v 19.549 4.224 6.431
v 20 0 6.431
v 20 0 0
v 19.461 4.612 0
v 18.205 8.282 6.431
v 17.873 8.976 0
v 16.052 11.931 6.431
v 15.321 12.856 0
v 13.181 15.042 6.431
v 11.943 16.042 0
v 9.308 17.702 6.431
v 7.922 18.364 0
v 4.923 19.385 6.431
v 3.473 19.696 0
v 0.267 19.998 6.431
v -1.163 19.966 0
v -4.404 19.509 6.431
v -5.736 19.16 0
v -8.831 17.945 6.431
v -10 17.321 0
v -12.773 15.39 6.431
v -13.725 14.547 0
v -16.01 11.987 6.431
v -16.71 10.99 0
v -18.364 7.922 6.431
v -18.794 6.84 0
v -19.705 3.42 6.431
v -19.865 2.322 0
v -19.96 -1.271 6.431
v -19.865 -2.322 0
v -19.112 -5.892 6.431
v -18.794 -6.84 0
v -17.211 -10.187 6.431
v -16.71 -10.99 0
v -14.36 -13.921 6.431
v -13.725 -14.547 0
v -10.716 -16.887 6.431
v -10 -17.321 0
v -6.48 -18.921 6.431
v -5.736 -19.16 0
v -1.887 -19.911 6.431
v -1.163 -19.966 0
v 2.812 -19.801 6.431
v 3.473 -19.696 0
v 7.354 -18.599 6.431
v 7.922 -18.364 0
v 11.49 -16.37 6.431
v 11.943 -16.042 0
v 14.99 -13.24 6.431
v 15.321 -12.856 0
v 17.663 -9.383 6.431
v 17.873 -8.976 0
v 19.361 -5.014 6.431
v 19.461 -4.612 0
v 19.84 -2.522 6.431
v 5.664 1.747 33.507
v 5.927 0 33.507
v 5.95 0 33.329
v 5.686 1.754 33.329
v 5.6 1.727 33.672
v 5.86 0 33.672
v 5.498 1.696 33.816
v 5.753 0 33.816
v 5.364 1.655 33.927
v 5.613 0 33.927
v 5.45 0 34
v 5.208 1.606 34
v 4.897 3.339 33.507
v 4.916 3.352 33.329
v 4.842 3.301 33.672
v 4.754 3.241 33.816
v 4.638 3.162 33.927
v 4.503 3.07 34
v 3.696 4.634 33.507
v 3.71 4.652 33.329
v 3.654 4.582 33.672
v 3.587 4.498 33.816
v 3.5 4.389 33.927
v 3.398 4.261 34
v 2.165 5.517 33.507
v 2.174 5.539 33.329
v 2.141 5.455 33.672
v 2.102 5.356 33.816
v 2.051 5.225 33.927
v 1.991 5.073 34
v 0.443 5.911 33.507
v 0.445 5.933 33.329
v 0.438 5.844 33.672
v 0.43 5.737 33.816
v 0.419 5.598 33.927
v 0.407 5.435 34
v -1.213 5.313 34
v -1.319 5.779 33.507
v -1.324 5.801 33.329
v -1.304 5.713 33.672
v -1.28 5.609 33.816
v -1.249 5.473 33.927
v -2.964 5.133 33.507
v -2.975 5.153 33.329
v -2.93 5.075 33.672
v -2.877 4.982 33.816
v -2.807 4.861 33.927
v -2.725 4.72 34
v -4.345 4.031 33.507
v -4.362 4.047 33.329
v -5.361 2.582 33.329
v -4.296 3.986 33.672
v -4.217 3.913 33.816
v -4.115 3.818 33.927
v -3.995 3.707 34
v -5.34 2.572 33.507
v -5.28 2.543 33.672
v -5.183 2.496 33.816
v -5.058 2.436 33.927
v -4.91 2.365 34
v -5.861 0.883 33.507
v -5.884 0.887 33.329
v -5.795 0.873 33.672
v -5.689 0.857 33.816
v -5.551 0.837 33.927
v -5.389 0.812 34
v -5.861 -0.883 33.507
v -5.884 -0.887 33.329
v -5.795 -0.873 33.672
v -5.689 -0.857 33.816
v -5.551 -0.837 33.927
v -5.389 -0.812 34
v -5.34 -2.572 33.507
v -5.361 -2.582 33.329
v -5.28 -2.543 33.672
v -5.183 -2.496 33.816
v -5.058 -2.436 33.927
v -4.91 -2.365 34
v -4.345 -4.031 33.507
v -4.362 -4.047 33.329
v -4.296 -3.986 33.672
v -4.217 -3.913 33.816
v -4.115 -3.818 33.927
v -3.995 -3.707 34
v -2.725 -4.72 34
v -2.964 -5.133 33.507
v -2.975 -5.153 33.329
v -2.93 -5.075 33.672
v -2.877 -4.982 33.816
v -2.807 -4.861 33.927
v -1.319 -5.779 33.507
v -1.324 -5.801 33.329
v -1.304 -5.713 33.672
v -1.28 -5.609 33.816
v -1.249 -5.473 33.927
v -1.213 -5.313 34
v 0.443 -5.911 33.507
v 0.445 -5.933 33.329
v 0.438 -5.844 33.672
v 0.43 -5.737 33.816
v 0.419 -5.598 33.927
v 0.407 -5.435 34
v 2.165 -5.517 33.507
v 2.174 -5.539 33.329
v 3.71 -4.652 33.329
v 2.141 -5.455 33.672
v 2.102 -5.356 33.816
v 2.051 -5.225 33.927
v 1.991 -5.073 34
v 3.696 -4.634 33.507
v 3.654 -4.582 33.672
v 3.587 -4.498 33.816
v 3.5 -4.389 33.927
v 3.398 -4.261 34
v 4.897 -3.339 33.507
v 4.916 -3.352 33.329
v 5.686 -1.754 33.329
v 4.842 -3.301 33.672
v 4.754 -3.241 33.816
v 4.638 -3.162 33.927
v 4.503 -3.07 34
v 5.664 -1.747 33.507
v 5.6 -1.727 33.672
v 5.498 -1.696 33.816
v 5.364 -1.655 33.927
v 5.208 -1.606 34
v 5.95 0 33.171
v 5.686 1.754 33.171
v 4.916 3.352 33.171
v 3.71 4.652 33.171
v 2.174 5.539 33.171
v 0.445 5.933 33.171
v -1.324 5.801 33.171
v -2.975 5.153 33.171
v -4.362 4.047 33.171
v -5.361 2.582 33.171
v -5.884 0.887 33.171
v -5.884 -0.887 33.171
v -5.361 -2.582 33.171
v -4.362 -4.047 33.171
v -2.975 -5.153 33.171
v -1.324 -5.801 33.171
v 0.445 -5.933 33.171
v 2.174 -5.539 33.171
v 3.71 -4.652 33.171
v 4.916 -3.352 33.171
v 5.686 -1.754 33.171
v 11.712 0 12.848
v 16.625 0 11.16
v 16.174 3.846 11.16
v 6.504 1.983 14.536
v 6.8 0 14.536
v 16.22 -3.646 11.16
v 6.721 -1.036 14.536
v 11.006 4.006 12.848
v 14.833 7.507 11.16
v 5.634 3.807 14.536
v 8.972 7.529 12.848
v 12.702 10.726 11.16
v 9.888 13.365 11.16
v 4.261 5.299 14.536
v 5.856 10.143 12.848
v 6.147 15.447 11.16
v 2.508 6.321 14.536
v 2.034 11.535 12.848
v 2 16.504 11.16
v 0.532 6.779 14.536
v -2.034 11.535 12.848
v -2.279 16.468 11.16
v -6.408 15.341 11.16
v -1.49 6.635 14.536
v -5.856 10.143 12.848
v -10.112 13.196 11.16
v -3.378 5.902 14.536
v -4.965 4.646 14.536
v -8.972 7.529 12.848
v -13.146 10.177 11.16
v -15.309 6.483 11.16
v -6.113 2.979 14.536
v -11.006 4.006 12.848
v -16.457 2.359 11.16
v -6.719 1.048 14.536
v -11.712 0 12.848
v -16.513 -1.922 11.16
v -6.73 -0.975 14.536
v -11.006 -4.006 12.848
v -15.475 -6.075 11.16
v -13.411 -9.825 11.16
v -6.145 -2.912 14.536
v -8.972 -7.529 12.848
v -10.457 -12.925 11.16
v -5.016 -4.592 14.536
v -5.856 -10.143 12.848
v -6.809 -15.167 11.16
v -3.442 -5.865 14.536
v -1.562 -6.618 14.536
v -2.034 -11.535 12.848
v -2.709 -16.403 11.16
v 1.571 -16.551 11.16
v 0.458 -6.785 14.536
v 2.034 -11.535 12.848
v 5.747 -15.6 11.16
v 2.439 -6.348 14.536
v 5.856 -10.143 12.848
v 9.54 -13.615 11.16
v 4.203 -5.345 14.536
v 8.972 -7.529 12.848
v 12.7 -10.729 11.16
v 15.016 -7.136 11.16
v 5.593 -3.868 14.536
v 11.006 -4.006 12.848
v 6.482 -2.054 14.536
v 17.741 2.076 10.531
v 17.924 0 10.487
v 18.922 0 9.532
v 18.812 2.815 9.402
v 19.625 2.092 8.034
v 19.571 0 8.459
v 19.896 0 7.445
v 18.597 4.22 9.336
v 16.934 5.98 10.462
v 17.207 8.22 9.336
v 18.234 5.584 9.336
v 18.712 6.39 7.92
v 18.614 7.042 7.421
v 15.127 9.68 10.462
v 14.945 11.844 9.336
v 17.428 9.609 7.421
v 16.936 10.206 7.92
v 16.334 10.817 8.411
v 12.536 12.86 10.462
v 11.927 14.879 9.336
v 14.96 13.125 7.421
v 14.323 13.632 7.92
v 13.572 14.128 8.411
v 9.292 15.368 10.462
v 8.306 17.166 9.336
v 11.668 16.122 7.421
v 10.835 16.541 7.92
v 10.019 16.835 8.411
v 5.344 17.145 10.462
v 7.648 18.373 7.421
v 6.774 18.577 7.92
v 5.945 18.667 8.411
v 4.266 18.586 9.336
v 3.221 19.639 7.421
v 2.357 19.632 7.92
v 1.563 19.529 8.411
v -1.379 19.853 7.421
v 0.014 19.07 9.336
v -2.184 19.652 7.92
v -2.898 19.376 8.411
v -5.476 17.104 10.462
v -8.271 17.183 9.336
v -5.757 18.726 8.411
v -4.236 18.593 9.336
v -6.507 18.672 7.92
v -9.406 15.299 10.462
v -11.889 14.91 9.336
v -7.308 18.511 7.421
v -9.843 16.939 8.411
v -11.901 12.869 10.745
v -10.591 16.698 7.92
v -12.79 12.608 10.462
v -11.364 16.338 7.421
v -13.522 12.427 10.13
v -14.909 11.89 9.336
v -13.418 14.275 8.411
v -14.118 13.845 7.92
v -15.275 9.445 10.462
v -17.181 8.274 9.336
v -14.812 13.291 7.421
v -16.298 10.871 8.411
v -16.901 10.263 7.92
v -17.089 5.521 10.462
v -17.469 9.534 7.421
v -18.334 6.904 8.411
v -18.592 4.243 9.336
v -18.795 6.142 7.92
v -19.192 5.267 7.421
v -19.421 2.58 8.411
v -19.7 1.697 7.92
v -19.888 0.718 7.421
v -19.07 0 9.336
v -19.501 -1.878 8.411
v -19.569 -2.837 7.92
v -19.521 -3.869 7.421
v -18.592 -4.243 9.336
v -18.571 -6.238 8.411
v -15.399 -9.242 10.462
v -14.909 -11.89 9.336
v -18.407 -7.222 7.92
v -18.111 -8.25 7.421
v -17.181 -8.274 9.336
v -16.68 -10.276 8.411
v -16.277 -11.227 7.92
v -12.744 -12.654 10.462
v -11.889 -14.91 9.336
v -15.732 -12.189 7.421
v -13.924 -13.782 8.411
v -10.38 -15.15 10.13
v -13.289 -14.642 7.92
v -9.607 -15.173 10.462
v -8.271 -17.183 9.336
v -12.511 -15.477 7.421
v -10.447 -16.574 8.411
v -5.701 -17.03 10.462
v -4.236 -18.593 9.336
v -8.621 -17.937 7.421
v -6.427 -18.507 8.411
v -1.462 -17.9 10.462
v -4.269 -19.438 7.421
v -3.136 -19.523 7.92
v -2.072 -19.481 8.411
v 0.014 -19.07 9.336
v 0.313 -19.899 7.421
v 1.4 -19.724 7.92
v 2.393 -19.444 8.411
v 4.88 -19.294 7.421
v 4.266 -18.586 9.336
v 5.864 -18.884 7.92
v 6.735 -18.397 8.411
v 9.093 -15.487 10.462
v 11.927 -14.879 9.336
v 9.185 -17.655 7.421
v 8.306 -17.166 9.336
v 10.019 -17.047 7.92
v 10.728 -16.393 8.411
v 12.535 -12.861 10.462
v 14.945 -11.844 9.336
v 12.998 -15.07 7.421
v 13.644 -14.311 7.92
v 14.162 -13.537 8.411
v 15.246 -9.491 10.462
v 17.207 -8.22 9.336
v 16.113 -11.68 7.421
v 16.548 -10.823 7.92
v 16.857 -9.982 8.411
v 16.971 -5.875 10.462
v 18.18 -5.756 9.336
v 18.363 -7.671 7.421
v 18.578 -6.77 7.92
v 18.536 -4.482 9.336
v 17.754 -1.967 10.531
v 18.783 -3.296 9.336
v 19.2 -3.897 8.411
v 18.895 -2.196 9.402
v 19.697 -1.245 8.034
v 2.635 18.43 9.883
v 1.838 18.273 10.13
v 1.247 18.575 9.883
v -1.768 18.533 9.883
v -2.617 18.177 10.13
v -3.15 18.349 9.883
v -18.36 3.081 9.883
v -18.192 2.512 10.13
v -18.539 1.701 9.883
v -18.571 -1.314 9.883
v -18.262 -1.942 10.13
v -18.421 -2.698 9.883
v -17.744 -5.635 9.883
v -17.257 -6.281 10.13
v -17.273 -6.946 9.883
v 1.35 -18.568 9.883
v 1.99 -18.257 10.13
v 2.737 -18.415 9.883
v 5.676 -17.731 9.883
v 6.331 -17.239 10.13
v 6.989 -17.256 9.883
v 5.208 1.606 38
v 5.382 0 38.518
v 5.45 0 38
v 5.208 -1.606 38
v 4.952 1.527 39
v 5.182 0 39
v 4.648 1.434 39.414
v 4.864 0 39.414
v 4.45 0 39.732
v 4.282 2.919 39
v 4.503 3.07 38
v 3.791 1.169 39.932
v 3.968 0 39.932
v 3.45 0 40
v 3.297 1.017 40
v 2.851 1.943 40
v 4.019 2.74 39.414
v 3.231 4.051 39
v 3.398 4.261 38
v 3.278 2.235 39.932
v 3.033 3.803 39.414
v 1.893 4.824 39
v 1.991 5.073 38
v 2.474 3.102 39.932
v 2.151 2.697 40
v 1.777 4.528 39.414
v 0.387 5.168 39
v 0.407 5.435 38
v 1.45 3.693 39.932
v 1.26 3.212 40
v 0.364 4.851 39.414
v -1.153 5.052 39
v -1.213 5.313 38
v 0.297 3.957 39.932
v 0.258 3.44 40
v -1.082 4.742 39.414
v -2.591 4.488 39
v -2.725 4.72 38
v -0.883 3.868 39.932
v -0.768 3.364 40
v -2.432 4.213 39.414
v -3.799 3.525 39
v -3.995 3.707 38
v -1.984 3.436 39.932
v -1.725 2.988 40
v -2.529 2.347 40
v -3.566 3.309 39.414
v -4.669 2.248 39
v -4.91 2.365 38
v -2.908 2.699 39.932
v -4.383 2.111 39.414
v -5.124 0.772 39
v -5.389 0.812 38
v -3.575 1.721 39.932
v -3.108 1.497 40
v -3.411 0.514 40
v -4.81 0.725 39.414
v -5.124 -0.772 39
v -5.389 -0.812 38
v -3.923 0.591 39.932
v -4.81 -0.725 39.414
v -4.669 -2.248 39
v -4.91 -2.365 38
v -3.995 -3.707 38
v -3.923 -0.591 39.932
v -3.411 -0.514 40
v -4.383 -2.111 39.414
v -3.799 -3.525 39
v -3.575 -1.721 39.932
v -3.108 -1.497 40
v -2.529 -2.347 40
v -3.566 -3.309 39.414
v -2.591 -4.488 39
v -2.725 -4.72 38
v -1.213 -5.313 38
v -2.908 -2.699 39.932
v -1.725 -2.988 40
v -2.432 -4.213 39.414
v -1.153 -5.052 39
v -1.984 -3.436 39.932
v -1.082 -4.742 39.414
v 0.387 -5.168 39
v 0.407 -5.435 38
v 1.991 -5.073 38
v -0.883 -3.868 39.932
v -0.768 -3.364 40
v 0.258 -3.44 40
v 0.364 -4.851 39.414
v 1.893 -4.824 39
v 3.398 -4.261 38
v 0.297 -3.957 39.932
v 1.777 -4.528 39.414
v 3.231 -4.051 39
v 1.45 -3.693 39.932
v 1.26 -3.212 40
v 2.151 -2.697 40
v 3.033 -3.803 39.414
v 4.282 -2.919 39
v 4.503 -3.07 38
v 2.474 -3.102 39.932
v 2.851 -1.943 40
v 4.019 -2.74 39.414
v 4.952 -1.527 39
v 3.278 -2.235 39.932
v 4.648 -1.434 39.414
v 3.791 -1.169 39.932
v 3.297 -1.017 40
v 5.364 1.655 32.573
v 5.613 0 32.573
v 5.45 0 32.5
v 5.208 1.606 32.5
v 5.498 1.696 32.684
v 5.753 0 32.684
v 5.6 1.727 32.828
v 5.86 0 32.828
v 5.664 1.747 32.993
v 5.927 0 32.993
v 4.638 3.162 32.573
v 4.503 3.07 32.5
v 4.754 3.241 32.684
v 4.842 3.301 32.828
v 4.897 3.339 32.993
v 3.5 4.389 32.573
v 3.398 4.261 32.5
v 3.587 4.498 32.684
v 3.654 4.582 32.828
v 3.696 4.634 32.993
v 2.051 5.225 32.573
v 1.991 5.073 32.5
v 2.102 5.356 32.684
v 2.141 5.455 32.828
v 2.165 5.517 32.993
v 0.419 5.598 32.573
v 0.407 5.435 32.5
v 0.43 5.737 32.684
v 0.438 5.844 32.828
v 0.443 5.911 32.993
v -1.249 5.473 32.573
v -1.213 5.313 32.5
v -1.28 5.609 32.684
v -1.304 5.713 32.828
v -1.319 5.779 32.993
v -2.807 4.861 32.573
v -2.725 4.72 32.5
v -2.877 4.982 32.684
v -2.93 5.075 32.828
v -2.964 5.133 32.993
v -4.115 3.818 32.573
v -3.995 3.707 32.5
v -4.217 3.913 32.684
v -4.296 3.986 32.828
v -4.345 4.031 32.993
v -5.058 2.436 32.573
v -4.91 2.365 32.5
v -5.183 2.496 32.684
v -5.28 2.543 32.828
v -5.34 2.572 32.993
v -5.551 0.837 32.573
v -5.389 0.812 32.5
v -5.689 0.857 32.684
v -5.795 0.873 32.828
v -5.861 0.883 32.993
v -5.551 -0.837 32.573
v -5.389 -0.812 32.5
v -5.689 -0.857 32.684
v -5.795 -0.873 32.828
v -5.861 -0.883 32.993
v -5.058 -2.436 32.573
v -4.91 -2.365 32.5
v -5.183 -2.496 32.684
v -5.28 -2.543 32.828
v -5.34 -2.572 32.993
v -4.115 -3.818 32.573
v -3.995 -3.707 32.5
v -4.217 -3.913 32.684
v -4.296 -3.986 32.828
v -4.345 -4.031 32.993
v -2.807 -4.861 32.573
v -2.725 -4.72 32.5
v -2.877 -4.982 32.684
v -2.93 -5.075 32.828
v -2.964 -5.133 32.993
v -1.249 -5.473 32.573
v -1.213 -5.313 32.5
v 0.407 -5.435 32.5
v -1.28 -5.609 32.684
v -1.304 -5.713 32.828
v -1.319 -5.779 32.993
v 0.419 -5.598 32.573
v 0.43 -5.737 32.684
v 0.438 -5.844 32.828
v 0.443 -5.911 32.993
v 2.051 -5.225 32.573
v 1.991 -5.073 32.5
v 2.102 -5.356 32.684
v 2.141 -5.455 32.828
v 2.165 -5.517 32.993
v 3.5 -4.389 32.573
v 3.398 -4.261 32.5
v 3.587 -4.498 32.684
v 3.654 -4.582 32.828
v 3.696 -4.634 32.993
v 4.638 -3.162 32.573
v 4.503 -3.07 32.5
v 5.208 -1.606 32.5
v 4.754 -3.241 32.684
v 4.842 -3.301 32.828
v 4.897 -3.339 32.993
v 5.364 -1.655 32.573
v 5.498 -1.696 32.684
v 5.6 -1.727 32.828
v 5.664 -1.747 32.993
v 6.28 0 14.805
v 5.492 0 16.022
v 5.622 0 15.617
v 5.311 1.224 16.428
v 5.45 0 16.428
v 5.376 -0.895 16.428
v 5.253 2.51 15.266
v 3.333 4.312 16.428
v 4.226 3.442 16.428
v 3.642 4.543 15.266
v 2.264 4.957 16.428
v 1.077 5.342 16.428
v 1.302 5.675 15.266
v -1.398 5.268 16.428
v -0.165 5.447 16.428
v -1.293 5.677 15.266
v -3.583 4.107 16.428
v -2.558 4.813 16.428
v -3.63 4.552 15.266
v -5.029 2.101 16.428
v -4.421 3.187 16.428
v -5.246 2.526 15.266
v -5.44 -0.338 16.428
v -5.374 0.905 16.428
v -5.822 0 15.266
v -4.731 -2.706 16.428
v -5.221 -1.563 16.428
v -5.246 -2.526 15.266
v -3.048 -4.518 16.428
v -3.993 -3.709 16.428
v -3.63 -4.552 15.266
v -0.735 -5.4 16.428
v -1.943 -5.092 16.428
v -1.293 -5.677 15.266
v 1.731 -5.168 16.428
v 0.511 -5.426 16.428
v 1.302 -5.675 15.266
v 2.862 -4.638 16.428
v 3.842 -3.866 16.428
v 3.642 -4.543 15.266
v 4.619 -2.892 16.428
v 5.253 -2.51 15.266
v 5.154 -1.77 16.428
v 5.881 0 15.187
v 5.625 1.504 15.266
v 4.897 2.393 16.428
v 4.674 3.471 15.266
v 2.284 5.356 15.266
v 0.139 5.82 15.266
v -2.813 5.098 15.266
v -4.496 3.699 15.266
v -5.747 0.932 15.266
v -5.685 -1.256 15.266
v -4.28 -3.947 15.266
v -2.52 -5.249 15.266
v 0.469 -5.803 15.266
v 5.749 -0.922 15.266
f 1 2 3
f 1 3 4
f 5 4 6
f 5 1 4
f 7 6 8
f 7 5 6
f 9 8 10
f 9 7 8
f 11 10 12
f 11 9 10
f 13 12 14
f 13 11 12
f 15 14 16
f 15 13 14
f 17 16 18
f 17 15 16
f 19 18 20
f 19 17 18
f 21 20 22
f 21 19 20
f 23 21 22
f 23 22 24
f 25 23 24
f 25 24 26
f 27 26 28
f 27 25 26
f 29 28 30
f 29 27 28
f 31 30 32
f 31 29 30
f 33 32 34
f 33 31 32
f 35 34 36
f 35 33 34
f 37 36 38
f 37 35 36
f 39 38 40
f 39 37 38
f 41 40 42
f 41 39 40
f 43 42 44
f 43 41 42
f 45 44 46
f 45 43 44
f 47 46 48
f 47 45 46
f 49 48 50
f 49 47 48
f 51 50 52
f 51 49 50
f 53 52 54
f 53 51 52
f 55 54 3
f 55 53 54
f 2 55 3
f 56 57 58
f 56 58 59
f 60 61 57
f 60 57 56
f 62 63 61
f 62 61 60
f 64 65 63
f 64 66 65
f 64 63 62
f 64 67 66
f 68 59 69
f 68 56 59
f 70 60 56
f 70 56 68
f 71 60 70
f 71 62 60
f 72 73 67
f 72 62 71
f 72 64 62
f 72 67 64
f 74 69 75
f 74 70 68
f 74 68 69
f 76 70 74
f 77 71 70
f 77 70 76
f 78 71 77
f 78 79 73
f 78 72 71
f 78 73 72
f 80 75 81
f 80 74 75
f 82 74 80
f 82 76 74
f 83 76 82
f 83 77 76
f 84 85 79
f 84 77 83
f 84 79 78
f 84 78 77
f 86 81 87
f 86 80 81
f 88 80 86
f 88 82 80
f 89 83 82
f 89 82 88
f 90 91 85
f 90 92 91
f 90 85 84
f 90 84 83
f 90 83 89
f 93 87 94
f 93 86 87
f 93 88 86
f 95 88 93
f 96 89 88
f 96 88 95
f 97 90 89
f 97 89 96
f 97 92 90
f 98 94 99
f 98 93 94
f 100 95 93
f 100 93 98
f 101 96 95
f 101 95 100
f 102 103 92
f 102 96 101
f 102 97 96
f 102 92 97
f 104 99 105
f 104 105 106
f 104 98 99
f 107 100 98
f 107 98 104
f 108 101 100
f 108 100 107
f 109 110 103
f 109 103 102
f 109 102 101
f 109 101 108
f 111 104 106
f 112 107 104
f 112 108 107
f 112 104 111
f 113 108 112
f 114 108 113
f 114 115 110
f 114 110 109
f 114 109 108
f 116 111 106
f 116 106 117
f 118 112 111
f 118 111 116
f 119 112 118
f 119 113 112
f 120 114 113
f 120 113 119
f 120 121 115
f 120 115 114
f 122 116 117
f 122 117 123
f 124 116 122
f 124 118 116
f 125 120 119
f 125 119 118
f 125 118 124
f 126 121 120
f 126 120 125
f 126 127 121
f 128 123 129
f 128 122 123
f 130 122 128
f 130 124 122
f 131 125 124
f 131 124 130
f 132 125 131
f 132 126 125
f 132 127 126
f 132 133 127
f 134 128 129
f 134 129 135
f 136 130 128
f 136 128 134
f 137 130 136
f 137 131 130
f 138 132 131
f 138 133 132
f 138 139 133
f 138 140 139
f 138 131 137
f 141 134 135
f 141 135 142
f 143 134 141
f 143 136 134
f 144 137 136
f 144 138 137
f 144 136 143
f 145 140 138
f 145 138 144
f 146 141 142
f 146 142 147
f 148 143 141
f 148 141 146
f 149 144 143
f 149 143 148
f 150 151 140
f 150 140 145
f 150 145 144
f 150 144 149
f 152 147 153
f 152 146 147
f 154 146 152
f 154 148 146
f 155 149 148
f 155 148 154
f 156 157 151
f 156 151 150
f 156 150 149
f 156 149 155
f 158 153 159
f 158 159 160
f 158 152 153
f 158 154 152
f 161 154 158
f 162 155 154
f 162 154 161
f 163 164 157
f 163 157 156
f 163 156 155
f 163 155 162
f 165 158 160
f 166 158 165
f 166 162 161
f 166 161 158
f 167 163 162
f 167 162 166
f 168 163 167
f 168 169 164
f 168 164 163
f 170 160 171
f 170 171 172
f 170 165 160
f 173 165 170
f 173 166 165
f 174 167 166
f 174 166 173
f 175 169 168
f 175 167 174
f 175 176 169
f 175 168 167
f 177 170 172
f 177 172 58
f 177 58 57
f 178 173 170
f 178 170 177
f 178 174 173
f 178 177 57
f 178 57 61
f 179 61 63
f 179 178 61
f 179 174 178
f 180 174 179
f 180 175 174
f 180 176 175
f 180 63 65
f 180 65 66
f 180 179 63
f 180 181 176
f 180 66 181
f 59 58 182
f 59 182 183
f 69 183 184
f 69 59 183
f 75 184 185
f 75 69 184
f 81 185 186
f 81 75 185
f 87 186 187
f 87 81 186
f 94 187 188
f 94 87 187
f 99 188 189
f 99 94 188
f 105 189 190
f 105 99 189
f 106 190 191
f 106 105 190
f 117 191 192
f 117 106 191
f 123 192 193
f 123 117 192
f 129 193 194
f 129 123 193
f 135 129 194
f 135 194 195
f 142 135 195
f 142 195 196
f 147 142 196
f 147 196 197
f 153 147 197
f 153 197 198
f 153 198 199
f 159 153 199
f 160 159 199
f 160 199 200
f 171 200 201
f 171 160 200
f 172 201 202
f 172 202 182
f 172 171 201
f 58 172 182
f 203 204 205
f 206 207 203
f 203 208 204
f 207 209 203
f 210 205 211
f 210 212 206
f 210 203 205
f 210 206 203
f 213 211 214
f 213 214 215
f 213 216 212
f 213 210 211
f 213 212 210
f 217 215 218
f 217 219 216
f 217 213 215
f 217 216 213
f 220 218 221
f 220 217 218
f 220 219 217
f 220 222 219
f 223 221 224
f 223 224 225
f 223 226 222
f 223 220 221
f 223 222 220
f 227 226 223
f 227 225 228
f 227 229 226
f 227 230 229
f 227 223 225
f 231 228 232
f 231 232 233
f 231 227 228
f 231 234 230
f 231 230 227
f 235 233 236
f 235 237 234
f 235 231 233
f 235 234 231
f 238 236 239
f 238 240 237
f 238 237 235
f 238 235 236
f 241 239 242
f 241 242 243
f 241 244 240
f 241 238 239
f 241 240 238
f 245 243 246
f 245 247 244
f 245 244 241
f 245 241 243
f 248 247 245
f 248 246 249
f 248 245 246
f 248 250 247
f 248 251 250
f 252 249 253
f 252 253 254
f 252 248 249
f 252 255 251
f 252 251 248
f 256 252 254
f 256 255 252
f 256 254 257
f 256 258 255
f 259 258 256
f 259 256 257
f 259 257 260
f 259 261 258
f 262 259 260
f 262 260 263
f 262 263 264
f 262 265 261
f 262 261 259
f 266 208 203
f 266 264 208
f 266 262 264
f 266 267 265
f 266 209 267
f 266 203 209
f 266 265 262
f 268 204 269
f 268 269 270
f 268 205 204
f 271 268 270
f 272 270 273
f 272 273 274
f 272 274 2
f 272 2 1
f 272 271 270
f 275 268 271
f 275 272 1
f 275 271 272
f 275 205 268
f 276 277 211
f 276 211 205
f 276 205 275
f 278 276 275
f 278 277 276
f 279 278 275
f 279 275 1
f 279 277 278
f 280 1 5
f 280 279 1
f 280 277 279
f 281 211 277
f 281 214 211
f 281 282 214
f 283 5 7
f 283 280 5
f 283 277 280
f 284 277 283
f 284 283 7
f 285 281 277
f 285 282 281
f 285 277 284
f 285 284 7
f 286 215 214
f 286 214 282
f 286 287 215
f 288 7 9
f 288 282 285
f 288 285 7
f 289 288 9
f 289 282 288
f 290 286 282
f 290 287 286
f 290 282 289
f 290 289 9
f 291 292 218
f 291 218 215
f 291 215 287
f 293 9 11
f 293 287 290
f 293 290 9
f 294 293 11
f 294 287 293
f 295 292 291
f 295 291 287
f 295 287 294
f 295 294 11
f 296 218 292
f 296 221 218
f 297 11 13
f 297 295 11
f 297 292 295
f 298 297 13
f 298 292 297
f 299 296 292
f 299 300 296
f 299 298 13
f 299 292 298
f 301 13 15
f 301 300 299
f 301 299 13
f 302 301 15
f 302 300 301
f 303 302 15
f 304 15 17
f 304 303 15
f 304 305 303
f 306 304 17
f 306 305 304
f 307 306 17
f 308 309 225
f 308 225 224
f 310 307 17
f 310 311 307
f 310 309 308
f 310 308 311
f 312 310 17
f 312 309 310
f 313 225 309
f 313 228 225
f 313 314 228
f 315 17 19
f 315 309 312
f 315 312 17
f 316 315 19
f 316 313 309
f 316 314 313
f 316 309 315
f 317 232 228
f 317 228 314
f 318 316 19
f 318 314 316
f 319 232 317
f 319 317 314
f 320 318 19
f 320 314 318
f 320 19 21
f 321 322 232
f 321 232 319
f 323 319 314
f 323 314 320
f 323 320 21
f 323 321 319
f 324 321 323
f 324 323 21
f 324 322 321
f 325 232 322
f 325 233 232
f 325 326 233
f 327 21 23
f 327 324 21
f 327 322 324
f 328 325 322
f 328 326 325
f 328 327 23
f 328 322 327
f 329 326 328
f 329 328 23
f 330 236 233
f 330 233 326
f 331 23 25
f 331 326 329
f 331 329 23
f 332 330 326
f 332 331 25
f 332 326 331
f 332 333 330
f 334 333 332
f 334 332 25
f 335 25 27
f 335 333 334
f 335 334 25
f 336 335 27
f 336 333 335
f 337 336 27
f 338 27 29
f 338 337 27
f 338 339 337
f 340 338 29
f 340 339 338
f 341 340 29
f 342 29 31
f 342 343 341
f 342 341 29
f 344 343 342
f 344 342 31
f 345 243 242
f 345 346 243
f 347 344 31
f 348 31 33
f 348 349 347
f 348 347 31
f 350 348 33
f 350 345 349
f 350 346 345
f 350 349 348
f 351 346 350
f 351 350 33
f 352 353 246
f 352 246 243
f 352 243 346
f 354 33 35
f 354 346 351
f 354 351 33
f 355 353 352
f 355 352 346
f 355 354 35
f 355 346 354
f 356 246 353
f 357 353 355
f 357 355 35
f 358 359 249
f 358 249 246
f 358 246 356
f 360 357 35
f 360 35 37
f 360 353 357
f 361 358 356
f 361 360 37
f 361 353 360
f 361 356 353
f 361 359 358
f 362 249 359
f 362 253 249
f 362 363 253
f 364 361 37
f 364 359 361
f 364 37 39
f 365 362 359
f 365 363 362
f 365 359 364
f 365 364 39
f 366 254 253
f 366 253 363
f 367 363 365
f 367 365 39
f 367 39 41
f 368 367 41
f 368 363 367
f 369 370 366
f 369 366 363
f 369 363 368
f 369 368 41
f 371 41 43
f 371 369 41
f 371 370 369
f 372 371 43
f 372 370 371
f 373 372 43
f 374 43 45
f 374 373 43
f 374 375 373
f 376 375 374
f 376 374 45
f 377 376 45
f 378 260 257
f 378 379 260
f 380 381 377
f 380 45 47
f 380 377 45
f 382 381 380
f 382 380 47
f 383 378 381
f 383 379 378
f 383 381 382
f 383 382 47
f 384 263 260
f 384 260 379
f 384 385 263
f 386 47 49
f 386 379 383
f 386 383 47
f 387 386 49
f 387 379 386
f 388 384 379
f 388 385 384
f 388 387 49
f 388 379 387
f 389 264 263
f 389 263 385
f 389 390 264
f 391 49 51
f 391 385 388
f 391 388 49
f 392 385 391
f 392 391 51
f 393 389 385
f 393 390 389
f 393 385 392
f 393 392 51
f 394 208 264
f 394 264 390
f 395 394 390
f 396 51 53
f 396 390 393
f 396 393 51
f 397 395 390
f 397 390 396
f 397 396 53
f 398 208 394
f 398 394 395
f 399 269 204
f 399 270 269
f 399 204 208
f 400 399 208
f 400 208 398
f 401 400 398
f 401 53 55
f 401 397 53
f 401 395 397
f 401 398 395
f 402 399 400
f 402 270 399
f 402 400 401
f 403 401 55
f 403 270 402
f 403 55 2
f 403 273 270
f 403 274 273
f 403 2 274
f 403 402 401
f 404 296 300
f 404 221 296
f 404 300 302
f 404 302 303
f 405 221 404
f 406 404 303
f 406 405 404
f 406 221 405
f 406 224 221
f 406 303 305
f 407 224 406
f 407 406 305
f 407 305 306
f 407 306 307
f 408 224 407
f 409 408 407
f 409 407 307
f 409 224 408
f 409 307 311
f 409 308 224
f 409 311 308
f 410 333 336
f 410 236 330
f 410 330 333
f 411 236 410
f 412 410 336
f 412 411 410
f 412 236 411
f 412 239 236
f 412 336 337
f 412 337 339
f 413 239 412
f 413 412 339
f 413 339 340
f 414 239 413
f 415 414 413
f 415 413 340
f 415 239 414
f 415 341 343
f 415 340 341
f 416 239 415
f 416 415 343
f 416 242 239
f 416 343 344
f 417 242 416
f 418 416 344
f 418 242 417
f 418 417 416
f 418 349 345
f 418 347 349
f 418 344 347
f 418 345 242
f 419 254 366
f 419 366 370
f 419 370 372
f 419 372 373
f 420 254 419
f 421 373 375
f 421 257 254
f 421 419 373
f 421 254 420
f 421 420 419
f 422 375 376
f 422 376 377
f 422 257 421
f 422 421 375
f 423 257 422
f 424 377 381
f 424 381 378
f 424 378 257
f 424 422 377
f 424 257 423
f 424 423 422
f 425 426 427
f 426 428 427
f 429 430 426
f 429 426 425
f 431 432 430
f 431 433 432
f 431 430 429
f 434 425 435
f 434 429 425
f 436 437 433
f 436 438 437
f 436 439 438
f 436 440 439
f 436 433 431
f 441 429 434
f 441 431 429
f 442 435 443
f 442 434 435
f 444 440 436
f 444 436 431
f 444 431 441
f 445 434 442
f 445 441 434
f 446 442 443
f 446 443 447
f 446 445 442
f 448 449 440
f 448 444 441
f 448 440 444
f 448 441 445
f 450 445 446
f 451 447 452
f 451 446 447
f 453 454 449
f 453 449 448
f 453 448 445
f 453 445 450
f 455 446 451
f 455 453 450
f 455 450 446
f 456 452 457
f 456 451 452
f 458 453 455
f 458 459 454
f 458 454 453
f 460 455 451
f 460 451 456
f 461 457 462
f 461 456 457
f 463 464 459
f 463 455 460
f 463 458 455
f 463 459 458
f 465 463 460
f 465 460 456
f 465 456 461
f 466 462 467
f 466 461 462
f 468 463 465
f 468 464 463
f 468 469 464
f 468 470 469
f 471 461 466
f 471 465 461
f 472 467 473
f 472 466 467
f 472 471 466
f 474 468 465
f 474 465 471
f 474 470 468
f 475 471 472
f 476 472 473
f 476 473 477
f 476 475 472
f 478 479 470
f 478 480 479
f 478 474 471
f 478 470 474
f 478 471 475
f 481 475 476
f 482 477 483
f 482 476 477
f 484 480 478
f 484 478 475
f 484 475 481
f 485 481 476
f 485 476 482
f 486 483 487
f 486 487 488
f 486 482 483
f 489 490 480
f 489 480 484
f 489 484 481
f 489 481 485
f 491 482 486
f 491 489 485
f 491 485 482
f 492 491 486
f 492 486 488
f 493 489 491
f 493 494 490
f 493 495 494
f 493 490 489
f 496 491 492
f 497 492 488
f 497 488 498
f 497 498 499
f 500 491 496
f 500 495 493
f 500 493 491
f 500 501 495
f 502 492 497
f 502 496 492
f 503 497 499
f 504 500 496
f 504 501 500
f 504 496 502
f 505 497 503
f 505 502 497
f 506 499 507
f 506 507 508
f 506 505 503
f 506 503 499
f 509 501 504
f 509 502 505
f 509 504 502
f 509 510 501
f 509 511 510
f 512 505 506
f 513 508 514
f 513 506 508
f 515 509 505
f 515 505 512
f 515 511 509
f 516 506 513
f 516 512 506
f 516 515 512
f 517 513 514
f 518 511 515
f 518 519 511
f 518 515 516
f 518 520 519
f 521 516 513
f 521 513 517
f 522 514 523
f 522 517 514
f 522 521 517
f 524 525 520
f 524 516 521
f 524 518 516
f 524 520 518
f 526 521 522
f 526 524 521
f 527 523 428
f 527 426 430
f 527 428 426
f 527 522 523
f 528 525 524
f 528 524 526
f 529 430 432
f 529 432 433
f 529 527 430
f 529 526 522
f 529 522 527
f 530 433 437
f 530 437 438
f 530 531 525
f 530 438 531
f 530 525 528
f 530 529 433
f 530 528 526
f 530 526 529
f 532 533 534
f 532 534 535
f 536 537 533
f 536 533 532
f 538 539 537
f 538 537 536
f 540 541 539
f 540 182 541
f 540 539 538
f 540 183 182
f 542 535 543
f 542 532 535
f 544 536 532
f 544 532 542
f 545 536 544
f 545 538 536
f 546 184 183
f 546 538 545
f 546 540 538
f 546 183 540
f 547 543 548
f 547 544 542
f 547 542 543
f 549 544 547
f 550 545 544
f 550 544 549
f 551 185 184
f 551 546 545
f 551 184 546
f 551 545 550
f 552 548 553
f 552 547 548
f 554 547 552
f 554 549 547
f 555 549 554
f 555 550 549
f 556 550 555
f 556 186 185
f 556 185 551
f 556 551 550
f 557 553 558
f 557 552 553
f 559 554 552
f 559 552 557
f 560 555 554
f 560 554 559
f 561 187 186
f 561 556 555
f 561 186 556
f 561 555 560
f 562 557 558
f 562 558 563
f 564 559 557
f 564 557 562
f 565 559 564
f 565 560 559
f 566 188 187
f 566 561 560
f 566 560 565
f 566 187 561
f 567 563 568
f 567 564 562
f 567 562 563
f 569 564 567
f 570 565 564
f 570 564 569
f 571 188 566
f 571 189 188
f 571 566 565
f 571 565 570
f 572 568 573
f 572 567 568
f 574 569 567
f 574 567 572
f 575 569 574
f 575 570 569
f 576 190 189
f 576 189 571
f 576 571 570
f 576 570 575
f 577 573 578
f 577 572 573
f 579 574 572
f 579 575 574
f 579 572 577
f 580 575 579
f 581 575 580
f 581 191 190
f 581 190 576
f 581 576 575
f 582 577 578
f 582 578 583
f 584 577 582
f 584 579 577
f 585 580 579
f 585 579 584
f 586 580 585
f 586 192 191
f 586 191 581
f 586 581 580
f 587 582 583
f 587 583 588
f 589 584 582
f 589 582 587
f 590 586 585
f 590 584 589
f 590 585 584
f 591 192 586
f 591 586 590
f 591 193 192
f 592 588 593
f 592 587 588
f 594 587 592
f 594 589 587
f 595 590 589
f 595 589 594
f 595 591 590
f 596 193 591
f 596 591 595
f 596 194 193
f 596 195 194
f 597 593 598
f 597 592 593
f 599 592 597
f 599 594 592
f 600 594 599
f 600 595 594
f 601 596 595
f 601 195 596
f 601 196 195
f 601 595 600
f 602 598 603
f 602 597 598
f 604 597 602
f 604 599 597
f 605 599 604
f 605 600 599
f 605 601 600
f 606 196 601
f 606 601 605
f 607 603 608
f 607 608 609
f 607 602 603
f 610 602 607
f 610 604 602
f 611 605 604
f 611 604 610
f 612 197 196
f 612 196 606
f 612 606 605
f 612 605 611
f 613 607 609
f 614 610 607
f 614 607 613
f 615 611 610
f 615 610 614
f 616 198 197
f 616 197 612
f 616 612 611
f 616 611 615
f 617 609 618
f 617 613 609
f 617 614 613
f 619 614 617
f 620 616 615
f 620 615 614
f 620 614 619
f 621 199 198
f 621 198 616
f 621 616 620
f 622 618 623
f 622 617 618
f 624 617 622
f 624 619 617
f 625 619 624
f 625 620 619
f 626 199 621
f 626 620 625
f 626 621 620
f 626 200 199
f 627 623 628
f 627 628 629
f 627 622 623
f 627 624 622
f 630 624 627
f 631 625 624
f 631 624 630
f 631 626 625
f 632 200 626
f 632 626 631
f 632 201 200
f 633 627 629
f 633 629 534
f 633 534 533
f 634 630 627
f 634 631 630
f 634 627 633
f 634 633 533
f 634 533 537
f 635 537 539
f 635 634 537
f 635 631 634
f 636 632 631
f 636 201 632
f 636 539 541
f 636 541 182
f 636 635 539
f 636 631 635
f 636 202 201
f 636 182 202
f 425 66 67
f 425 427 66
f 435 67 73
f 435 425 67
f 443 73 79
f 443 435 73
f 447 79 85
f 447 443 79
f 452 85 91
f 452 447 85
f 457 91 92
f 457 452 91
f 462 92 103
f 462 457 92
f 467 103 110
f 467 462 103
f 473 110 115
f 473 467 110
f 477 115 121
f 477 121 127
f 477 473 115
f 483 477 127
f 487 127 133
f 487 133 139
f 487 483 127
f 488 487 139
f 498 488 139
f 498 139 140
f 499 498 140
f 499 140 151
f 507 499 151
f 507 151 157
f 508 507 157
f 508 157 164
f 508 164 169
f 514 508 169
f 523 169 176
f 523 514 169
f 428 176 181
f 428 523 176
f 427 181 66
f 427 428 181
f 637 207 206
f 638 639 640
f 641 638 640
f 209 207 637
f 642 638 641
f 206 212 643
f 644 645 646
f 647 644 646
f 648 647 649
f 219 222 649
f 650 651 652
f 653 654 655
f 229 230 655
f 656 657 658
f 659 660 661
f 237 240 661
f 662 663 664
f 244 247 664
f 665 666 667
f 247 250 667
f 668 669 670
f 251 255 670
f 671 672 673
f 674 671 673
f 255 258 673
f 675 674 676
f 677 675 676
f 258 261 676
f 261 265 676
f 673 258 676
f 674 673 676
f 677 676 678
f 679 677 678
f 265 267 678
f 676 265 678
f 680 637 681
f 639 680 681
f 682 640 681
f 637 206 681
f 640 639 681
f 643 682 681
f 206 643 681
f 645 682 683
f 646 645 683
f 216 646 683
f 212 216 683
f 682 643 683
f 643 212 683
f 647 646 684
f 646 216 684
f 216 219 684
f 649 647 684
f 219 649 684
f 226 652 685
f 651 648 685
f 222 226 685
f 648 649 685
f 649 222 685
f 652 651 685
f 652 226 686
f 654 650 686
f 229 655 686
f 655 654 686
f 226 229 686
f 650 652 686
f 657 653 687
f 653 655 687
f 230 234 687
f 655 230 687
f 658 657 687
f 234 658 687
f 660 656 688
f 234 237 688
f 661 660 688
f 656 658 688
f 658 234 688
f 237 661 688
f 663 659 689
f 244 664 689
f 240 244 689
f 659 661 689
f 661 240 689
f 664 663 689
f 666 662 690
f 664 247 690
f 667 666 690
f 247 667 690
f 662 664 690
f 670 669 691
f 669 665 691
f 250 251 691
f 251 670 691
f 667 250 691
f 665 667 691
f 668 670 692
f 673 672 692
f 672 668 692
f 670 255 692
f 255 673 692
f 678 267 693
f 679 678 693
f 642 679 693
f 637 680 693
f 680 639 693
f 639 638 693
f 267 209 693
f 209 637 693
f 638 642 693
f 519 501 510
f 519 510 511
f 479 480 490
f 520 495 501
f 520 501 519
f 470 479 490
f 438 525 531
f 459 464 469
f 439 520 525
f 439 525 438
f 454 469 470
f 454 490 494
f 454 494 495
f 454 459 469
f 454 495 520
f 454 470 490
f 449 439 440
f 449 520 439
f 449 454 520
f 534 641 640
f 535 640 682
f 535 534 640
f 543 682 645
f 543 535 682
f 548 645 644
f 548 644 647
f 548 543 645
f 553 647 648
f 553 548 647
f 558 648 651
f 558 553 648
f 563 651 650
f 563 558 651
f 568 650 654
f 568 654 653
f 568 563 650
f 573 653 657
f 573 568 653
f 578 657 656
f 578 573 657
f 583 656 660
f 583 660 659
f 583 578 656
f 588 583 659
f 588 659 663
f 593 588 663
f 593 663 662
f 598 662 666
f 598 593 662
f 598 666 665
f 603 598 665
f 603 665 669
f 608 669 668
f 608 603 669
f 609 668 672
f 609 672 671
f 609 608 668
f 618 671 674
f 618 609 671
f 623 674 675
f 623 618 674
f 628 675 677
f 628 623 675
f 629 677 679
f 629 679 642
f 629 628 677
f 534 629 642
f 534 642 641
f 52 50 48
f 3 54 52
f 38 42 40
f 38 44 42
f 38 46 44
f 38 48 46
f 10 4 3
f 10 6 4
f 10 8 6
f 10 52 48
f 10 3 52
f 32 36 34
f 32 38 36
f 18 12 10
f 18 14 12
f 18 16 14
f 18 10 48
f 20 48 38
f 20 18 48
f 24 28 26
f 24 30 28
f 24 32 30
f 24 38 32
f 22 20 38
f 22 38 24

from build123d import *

# Parameters (mm, degrees)
F0_W = 0.5
F0_H = 1.5
F2_R = 2
F3_R = 5


# Not quite as in the source:
# - a fillet or chamfer that OpenCascade refuses, or shapes differently, is made with other operations: its cross-section is extruded or revolved along the edge and cut away or added


with BuildPart() as f1:
    # F0 (on Front) → F1 (revolve)
    with BuildSketch(Plane.XZ):
        Polygon((0, 40), (0, 0), (20, 0), (20, 10), (5.45, 15), (5.45, 32.5), (5.45, 34), (5.45, 40), align=None)
        with Locations((5.7, 33.25)):
            Rectangle(F0_W, F0_H)
    revolve(axis=Axis((0, 0, 20), (0, 0, 1)))

    # F2
    f2_edges = [f1.edges().sort_by_distance(p)[0] for p in [
        (-5.45, 0, 40),
        (-5.45, 0, 15),
    ]]
    fillet(f2_edges, radius=F2_R)

    # F3
    f3_edges = [f1.edges().sort_by_distance(p)[0] for p in [
        (-20, 0, 10),
    ]]
    fillet(f3_edges, radius=F3_R)

    # F4: fillet of radius 0.7 on 3 edges, made by hand

    # F4_s1 → F4_t2 (revolve, cut)
    with BuildSketch(Plane.XZ):
        with BuildLine():
            ThreePointArc((5.45, 32.5), (5.811248608, 32.75249038), (5.95, 33.1708203932))
            Line((5.95, 33.1708203932), (5.95, 32.5))
            Line((5.95, 32.5), (5.45, 32.5))
        make_face()
    revolve(axis=Axis((0, 0, 32.5), (0, 0, 1)), mode=Mode.SUBTRACT)

    # F4_s3 → F4_t4 (revolve, cut)
    with BuildSketch(Plane.XZ):
        with BuildLine():
            ThreePointArc((5.95, 33.3291796068), (5.811248608, 33.74750962), (5.45, 34))
            Line((5.45, 34), (5.95, 34))
            Line((5.95, 34), (5.95, 33.3291796068))
        make_face()
    revolve(axis=Axis((0, 0, 34), (0, 0, 1)), mode=Mode.SUBTRACT)


solid = f1.part
